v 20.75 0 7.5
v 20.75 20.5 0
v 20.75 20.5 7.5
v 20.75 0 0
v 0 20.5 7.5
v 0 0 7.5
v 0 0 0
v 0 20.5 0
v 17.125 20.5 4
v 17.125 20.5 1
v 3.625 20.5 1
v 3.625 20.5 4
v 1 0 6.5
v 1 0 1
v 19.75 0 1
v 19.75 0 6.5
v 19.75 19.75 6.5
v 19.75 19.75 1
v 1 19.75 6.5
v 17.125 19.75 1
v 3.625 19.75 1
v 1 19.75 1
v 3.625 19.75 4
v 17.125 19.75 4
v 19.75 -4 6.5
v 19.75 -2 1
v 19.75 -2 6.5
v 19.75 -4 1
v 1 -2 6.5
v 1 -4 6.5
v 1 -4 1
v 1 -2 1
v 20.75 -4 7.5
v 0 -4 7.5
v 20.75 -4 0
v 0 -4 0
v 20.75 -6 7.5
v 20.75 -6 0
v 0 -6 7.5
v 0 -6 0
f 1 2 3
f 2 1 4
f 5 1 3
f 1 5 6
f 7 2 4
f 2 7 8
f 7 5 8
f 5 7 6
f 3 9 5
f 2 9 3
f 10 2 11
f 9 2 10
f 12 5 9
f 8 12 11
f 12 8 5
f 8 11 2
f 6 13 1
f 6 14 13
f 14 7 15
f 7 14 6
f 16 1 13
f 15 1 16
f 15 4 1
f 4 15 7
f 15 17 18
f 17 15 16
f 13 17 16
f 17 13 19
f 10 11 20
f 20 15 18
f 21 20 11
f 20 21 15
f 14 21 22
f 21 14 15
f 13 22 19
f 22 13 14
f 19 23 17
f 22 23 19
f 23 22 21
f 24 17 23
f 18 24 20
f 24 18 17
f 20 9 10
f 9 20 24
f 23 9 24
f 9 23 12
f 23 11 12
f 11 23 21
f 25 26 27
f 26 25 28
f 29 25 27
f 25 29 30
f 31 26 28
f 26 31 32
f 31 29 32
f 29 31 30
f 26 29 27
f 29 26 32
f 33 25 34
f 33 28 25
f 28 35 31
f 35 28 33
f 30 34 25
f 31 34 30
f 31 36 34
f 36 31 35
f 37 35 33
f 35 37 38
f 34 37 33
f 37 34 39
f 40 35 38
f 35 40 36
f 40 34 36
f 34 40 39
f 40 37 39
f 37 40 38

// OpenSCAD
a = 7.5;//höhe
b = 20.75;//breite

difference(){
    cube([b, 20.5, a], false);
    translate([1, -1, 1]){
        cube([b-2, 20.75, a-2], false);
    }
    translate([3.625, 0.25, 1]){
        cube([13.5, 22.5, 3], false);
    }
}



//lid
translate([1, -4, 1]){
    cube([b-2, 2, a-2], false);
}
translate([0, -6, 0]){
    cube([b, 2, a], false);
}


echo("\n\n\t\tThis is a design for a case for the Digispark\n");
